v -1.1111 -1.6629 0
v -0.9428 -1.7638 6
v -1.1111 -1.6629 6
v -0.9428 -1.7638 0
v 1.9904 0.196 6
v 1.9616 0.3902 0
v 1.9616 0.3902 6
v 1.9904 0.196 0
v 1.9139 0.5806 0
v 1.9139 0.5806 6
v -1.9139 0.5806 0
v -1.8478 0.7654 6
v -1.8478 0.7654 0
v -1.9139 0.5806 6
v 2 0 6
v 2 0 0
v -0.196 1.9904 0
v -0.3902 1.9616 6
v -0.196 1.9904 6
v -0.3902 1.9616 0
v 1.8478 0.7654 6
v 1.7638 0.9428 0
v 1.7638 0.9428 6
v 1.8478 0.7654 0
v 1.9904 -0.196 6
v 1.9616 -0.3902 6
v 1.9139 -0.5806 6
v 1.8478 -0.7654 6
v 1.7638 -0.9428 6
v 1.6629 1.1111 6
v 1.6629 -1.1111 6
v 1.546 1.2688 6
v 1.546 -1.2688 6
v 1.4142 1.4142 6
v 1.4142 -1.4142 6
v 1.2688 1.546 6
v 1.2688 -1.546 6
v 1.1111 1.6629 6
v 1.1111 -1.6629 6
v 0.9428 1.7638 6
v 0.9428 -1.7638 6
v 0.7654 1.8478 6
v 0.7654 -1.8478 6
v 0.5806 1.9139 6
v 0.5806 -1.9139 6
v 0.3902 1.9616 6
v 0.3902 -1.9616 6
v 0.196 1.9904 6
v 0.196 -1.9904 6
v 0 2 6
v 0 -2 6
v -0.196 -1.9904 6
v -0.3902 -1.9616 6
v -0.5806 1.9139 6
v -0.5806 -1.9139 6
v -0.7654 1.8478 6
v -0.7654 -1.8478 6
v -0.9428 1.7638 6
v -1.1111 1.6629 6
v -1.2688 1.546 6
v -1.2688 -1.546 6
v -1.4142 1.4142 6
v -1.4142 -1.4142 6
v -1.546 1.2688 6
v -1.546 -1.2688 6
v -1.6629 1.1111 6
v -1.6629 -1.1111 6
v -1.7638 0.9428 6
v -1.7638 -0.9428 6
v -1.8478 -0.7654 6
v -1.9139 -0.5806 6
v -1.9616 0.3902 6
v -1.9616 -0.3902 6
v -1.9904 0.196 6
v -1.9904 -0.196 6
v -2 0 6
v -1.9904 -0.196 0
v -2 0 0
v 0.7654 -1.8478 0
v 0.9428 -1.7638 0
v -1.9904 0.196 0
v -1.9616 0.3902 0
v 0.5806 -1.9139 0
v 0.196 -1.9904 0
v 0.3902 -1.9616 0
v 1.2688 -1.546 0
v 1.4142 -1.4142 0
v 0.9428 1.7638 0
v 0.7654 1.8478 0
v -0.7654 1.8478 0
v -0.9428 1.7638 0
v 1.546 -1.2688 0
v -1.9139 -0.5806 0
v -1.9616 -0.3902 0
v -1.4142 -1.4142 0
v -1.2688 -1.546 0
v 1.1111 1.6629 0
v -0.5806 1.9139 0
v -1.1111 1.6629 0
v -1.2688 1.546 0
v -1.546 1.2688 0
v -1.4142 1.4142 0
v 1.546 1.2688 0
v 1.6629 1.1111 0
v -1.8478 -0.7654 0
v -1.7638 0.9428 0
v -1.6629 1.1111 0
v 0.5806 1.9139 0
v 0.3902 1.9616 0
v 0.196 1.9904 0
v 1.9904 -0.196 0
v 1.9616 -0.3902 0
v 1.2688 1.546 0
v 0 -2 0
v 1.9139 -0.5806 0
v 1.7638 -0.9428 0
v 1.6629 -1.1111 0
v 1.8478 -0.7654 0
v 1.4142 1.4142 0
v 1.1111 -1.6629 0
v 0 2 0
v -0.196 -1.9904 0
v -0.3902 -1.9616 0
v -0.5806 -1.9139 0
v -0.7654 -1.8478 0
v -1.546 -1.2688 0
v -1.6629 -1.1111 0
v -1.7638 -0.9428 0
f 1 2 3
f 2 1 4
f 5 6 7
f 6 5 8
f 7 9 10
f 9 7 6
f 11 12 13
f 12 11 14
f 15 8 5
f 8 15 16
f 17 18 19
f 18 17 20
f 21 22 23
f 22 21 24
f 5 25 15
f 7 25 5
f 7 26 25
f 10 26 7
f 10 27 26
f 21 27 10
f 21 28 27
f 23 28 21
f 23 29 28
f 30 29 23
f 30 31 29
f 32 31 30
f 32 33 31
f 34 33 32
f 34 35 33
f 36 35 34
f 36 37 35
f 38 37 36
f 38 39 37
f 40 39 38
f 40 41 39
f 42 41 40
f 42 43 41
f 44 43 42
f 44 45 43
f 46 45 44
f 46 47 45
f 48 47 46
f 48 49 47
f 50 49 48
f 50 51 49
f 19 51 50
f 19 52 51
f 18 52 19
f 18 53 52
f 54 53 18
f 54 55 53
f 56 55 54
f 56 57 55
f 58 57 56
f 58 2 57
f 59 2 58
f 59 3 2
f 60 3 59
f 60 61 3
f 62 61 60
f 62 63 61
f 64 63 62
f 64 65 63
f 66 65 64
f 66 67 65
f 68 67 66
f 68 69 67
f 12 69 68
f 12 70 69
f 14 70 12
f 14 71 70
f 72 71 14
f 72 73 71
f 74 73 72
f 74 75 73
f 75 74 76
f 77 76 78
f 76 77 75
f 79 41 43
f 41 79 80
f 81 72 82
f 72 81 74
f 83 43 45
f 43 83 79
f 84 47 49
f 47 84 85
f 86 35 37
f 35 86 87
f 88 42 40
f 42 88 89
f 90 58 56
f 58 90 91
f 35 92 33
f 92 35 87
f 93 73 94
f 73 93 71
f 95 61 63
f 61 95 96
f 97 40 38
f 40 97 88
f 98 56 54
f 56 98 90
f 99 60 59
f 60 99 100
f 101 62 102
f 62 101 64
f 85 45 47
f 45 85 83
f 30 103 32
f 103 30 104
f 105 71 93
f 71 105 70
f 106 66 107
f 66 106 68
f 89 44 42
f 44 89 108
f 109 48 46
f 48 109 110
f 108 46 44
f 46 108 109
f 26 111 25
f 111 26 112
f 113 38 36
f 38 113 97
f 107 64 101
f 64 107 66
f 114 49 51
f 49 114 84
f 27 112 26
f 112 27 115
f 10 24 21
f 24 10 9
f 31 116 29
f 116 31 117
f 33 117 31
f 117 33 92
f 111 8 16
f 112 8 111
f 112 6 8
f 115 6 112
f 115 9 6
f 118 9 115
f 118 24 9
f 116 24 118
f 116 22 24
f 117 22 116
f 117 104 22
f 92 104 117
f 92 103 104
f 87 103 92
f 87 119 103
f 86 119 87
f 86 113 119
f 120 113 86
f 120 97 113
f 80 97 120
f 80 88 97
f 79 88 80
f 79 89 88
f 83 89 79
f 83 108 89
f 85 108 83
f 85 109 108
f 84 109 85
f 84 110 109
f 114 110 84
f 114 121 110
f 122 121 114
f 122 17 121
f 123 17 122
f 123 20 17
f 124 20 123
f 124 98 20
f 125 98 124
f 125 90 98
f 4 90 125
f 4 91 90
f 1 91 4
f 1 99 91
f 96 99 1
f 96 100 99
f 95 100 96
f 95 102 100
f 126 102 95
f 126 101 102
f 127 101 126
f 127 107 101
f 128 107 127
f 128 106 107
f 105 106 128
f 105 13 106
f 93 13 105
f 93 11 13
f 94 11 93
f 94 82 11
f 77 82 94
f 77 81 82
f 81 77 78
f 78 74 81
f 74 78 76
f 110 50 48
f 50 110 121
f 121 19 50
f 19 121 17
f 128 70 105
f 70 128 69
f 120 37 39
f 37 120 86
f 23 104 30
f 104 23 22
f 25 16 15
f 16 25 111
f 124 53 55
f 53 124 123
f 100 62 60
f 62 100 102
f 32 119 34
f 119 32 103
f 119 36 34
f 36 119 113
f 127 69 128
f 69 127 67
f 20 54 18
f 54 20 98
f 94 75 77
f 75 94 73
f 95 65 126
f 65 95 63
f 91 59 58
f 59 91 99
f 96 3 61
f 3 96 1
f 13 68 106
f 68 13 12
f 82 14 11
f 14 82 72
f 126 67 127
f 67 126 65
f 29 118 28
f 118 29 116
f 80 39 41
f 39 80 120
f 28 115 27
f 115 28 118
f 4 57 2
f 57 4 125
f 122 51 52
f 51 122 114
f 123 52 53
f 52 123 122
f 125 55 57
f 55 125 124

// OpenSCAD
module radial() {
    difference() {
        cylinder(h = 6, r1 = 2, r2 = 2, $fn = 64);
        translate([0, 0, -1])
            cylinder(h = 8, r1 = 0, r2 = 0, $fn = 64);
    }
}

radial();
